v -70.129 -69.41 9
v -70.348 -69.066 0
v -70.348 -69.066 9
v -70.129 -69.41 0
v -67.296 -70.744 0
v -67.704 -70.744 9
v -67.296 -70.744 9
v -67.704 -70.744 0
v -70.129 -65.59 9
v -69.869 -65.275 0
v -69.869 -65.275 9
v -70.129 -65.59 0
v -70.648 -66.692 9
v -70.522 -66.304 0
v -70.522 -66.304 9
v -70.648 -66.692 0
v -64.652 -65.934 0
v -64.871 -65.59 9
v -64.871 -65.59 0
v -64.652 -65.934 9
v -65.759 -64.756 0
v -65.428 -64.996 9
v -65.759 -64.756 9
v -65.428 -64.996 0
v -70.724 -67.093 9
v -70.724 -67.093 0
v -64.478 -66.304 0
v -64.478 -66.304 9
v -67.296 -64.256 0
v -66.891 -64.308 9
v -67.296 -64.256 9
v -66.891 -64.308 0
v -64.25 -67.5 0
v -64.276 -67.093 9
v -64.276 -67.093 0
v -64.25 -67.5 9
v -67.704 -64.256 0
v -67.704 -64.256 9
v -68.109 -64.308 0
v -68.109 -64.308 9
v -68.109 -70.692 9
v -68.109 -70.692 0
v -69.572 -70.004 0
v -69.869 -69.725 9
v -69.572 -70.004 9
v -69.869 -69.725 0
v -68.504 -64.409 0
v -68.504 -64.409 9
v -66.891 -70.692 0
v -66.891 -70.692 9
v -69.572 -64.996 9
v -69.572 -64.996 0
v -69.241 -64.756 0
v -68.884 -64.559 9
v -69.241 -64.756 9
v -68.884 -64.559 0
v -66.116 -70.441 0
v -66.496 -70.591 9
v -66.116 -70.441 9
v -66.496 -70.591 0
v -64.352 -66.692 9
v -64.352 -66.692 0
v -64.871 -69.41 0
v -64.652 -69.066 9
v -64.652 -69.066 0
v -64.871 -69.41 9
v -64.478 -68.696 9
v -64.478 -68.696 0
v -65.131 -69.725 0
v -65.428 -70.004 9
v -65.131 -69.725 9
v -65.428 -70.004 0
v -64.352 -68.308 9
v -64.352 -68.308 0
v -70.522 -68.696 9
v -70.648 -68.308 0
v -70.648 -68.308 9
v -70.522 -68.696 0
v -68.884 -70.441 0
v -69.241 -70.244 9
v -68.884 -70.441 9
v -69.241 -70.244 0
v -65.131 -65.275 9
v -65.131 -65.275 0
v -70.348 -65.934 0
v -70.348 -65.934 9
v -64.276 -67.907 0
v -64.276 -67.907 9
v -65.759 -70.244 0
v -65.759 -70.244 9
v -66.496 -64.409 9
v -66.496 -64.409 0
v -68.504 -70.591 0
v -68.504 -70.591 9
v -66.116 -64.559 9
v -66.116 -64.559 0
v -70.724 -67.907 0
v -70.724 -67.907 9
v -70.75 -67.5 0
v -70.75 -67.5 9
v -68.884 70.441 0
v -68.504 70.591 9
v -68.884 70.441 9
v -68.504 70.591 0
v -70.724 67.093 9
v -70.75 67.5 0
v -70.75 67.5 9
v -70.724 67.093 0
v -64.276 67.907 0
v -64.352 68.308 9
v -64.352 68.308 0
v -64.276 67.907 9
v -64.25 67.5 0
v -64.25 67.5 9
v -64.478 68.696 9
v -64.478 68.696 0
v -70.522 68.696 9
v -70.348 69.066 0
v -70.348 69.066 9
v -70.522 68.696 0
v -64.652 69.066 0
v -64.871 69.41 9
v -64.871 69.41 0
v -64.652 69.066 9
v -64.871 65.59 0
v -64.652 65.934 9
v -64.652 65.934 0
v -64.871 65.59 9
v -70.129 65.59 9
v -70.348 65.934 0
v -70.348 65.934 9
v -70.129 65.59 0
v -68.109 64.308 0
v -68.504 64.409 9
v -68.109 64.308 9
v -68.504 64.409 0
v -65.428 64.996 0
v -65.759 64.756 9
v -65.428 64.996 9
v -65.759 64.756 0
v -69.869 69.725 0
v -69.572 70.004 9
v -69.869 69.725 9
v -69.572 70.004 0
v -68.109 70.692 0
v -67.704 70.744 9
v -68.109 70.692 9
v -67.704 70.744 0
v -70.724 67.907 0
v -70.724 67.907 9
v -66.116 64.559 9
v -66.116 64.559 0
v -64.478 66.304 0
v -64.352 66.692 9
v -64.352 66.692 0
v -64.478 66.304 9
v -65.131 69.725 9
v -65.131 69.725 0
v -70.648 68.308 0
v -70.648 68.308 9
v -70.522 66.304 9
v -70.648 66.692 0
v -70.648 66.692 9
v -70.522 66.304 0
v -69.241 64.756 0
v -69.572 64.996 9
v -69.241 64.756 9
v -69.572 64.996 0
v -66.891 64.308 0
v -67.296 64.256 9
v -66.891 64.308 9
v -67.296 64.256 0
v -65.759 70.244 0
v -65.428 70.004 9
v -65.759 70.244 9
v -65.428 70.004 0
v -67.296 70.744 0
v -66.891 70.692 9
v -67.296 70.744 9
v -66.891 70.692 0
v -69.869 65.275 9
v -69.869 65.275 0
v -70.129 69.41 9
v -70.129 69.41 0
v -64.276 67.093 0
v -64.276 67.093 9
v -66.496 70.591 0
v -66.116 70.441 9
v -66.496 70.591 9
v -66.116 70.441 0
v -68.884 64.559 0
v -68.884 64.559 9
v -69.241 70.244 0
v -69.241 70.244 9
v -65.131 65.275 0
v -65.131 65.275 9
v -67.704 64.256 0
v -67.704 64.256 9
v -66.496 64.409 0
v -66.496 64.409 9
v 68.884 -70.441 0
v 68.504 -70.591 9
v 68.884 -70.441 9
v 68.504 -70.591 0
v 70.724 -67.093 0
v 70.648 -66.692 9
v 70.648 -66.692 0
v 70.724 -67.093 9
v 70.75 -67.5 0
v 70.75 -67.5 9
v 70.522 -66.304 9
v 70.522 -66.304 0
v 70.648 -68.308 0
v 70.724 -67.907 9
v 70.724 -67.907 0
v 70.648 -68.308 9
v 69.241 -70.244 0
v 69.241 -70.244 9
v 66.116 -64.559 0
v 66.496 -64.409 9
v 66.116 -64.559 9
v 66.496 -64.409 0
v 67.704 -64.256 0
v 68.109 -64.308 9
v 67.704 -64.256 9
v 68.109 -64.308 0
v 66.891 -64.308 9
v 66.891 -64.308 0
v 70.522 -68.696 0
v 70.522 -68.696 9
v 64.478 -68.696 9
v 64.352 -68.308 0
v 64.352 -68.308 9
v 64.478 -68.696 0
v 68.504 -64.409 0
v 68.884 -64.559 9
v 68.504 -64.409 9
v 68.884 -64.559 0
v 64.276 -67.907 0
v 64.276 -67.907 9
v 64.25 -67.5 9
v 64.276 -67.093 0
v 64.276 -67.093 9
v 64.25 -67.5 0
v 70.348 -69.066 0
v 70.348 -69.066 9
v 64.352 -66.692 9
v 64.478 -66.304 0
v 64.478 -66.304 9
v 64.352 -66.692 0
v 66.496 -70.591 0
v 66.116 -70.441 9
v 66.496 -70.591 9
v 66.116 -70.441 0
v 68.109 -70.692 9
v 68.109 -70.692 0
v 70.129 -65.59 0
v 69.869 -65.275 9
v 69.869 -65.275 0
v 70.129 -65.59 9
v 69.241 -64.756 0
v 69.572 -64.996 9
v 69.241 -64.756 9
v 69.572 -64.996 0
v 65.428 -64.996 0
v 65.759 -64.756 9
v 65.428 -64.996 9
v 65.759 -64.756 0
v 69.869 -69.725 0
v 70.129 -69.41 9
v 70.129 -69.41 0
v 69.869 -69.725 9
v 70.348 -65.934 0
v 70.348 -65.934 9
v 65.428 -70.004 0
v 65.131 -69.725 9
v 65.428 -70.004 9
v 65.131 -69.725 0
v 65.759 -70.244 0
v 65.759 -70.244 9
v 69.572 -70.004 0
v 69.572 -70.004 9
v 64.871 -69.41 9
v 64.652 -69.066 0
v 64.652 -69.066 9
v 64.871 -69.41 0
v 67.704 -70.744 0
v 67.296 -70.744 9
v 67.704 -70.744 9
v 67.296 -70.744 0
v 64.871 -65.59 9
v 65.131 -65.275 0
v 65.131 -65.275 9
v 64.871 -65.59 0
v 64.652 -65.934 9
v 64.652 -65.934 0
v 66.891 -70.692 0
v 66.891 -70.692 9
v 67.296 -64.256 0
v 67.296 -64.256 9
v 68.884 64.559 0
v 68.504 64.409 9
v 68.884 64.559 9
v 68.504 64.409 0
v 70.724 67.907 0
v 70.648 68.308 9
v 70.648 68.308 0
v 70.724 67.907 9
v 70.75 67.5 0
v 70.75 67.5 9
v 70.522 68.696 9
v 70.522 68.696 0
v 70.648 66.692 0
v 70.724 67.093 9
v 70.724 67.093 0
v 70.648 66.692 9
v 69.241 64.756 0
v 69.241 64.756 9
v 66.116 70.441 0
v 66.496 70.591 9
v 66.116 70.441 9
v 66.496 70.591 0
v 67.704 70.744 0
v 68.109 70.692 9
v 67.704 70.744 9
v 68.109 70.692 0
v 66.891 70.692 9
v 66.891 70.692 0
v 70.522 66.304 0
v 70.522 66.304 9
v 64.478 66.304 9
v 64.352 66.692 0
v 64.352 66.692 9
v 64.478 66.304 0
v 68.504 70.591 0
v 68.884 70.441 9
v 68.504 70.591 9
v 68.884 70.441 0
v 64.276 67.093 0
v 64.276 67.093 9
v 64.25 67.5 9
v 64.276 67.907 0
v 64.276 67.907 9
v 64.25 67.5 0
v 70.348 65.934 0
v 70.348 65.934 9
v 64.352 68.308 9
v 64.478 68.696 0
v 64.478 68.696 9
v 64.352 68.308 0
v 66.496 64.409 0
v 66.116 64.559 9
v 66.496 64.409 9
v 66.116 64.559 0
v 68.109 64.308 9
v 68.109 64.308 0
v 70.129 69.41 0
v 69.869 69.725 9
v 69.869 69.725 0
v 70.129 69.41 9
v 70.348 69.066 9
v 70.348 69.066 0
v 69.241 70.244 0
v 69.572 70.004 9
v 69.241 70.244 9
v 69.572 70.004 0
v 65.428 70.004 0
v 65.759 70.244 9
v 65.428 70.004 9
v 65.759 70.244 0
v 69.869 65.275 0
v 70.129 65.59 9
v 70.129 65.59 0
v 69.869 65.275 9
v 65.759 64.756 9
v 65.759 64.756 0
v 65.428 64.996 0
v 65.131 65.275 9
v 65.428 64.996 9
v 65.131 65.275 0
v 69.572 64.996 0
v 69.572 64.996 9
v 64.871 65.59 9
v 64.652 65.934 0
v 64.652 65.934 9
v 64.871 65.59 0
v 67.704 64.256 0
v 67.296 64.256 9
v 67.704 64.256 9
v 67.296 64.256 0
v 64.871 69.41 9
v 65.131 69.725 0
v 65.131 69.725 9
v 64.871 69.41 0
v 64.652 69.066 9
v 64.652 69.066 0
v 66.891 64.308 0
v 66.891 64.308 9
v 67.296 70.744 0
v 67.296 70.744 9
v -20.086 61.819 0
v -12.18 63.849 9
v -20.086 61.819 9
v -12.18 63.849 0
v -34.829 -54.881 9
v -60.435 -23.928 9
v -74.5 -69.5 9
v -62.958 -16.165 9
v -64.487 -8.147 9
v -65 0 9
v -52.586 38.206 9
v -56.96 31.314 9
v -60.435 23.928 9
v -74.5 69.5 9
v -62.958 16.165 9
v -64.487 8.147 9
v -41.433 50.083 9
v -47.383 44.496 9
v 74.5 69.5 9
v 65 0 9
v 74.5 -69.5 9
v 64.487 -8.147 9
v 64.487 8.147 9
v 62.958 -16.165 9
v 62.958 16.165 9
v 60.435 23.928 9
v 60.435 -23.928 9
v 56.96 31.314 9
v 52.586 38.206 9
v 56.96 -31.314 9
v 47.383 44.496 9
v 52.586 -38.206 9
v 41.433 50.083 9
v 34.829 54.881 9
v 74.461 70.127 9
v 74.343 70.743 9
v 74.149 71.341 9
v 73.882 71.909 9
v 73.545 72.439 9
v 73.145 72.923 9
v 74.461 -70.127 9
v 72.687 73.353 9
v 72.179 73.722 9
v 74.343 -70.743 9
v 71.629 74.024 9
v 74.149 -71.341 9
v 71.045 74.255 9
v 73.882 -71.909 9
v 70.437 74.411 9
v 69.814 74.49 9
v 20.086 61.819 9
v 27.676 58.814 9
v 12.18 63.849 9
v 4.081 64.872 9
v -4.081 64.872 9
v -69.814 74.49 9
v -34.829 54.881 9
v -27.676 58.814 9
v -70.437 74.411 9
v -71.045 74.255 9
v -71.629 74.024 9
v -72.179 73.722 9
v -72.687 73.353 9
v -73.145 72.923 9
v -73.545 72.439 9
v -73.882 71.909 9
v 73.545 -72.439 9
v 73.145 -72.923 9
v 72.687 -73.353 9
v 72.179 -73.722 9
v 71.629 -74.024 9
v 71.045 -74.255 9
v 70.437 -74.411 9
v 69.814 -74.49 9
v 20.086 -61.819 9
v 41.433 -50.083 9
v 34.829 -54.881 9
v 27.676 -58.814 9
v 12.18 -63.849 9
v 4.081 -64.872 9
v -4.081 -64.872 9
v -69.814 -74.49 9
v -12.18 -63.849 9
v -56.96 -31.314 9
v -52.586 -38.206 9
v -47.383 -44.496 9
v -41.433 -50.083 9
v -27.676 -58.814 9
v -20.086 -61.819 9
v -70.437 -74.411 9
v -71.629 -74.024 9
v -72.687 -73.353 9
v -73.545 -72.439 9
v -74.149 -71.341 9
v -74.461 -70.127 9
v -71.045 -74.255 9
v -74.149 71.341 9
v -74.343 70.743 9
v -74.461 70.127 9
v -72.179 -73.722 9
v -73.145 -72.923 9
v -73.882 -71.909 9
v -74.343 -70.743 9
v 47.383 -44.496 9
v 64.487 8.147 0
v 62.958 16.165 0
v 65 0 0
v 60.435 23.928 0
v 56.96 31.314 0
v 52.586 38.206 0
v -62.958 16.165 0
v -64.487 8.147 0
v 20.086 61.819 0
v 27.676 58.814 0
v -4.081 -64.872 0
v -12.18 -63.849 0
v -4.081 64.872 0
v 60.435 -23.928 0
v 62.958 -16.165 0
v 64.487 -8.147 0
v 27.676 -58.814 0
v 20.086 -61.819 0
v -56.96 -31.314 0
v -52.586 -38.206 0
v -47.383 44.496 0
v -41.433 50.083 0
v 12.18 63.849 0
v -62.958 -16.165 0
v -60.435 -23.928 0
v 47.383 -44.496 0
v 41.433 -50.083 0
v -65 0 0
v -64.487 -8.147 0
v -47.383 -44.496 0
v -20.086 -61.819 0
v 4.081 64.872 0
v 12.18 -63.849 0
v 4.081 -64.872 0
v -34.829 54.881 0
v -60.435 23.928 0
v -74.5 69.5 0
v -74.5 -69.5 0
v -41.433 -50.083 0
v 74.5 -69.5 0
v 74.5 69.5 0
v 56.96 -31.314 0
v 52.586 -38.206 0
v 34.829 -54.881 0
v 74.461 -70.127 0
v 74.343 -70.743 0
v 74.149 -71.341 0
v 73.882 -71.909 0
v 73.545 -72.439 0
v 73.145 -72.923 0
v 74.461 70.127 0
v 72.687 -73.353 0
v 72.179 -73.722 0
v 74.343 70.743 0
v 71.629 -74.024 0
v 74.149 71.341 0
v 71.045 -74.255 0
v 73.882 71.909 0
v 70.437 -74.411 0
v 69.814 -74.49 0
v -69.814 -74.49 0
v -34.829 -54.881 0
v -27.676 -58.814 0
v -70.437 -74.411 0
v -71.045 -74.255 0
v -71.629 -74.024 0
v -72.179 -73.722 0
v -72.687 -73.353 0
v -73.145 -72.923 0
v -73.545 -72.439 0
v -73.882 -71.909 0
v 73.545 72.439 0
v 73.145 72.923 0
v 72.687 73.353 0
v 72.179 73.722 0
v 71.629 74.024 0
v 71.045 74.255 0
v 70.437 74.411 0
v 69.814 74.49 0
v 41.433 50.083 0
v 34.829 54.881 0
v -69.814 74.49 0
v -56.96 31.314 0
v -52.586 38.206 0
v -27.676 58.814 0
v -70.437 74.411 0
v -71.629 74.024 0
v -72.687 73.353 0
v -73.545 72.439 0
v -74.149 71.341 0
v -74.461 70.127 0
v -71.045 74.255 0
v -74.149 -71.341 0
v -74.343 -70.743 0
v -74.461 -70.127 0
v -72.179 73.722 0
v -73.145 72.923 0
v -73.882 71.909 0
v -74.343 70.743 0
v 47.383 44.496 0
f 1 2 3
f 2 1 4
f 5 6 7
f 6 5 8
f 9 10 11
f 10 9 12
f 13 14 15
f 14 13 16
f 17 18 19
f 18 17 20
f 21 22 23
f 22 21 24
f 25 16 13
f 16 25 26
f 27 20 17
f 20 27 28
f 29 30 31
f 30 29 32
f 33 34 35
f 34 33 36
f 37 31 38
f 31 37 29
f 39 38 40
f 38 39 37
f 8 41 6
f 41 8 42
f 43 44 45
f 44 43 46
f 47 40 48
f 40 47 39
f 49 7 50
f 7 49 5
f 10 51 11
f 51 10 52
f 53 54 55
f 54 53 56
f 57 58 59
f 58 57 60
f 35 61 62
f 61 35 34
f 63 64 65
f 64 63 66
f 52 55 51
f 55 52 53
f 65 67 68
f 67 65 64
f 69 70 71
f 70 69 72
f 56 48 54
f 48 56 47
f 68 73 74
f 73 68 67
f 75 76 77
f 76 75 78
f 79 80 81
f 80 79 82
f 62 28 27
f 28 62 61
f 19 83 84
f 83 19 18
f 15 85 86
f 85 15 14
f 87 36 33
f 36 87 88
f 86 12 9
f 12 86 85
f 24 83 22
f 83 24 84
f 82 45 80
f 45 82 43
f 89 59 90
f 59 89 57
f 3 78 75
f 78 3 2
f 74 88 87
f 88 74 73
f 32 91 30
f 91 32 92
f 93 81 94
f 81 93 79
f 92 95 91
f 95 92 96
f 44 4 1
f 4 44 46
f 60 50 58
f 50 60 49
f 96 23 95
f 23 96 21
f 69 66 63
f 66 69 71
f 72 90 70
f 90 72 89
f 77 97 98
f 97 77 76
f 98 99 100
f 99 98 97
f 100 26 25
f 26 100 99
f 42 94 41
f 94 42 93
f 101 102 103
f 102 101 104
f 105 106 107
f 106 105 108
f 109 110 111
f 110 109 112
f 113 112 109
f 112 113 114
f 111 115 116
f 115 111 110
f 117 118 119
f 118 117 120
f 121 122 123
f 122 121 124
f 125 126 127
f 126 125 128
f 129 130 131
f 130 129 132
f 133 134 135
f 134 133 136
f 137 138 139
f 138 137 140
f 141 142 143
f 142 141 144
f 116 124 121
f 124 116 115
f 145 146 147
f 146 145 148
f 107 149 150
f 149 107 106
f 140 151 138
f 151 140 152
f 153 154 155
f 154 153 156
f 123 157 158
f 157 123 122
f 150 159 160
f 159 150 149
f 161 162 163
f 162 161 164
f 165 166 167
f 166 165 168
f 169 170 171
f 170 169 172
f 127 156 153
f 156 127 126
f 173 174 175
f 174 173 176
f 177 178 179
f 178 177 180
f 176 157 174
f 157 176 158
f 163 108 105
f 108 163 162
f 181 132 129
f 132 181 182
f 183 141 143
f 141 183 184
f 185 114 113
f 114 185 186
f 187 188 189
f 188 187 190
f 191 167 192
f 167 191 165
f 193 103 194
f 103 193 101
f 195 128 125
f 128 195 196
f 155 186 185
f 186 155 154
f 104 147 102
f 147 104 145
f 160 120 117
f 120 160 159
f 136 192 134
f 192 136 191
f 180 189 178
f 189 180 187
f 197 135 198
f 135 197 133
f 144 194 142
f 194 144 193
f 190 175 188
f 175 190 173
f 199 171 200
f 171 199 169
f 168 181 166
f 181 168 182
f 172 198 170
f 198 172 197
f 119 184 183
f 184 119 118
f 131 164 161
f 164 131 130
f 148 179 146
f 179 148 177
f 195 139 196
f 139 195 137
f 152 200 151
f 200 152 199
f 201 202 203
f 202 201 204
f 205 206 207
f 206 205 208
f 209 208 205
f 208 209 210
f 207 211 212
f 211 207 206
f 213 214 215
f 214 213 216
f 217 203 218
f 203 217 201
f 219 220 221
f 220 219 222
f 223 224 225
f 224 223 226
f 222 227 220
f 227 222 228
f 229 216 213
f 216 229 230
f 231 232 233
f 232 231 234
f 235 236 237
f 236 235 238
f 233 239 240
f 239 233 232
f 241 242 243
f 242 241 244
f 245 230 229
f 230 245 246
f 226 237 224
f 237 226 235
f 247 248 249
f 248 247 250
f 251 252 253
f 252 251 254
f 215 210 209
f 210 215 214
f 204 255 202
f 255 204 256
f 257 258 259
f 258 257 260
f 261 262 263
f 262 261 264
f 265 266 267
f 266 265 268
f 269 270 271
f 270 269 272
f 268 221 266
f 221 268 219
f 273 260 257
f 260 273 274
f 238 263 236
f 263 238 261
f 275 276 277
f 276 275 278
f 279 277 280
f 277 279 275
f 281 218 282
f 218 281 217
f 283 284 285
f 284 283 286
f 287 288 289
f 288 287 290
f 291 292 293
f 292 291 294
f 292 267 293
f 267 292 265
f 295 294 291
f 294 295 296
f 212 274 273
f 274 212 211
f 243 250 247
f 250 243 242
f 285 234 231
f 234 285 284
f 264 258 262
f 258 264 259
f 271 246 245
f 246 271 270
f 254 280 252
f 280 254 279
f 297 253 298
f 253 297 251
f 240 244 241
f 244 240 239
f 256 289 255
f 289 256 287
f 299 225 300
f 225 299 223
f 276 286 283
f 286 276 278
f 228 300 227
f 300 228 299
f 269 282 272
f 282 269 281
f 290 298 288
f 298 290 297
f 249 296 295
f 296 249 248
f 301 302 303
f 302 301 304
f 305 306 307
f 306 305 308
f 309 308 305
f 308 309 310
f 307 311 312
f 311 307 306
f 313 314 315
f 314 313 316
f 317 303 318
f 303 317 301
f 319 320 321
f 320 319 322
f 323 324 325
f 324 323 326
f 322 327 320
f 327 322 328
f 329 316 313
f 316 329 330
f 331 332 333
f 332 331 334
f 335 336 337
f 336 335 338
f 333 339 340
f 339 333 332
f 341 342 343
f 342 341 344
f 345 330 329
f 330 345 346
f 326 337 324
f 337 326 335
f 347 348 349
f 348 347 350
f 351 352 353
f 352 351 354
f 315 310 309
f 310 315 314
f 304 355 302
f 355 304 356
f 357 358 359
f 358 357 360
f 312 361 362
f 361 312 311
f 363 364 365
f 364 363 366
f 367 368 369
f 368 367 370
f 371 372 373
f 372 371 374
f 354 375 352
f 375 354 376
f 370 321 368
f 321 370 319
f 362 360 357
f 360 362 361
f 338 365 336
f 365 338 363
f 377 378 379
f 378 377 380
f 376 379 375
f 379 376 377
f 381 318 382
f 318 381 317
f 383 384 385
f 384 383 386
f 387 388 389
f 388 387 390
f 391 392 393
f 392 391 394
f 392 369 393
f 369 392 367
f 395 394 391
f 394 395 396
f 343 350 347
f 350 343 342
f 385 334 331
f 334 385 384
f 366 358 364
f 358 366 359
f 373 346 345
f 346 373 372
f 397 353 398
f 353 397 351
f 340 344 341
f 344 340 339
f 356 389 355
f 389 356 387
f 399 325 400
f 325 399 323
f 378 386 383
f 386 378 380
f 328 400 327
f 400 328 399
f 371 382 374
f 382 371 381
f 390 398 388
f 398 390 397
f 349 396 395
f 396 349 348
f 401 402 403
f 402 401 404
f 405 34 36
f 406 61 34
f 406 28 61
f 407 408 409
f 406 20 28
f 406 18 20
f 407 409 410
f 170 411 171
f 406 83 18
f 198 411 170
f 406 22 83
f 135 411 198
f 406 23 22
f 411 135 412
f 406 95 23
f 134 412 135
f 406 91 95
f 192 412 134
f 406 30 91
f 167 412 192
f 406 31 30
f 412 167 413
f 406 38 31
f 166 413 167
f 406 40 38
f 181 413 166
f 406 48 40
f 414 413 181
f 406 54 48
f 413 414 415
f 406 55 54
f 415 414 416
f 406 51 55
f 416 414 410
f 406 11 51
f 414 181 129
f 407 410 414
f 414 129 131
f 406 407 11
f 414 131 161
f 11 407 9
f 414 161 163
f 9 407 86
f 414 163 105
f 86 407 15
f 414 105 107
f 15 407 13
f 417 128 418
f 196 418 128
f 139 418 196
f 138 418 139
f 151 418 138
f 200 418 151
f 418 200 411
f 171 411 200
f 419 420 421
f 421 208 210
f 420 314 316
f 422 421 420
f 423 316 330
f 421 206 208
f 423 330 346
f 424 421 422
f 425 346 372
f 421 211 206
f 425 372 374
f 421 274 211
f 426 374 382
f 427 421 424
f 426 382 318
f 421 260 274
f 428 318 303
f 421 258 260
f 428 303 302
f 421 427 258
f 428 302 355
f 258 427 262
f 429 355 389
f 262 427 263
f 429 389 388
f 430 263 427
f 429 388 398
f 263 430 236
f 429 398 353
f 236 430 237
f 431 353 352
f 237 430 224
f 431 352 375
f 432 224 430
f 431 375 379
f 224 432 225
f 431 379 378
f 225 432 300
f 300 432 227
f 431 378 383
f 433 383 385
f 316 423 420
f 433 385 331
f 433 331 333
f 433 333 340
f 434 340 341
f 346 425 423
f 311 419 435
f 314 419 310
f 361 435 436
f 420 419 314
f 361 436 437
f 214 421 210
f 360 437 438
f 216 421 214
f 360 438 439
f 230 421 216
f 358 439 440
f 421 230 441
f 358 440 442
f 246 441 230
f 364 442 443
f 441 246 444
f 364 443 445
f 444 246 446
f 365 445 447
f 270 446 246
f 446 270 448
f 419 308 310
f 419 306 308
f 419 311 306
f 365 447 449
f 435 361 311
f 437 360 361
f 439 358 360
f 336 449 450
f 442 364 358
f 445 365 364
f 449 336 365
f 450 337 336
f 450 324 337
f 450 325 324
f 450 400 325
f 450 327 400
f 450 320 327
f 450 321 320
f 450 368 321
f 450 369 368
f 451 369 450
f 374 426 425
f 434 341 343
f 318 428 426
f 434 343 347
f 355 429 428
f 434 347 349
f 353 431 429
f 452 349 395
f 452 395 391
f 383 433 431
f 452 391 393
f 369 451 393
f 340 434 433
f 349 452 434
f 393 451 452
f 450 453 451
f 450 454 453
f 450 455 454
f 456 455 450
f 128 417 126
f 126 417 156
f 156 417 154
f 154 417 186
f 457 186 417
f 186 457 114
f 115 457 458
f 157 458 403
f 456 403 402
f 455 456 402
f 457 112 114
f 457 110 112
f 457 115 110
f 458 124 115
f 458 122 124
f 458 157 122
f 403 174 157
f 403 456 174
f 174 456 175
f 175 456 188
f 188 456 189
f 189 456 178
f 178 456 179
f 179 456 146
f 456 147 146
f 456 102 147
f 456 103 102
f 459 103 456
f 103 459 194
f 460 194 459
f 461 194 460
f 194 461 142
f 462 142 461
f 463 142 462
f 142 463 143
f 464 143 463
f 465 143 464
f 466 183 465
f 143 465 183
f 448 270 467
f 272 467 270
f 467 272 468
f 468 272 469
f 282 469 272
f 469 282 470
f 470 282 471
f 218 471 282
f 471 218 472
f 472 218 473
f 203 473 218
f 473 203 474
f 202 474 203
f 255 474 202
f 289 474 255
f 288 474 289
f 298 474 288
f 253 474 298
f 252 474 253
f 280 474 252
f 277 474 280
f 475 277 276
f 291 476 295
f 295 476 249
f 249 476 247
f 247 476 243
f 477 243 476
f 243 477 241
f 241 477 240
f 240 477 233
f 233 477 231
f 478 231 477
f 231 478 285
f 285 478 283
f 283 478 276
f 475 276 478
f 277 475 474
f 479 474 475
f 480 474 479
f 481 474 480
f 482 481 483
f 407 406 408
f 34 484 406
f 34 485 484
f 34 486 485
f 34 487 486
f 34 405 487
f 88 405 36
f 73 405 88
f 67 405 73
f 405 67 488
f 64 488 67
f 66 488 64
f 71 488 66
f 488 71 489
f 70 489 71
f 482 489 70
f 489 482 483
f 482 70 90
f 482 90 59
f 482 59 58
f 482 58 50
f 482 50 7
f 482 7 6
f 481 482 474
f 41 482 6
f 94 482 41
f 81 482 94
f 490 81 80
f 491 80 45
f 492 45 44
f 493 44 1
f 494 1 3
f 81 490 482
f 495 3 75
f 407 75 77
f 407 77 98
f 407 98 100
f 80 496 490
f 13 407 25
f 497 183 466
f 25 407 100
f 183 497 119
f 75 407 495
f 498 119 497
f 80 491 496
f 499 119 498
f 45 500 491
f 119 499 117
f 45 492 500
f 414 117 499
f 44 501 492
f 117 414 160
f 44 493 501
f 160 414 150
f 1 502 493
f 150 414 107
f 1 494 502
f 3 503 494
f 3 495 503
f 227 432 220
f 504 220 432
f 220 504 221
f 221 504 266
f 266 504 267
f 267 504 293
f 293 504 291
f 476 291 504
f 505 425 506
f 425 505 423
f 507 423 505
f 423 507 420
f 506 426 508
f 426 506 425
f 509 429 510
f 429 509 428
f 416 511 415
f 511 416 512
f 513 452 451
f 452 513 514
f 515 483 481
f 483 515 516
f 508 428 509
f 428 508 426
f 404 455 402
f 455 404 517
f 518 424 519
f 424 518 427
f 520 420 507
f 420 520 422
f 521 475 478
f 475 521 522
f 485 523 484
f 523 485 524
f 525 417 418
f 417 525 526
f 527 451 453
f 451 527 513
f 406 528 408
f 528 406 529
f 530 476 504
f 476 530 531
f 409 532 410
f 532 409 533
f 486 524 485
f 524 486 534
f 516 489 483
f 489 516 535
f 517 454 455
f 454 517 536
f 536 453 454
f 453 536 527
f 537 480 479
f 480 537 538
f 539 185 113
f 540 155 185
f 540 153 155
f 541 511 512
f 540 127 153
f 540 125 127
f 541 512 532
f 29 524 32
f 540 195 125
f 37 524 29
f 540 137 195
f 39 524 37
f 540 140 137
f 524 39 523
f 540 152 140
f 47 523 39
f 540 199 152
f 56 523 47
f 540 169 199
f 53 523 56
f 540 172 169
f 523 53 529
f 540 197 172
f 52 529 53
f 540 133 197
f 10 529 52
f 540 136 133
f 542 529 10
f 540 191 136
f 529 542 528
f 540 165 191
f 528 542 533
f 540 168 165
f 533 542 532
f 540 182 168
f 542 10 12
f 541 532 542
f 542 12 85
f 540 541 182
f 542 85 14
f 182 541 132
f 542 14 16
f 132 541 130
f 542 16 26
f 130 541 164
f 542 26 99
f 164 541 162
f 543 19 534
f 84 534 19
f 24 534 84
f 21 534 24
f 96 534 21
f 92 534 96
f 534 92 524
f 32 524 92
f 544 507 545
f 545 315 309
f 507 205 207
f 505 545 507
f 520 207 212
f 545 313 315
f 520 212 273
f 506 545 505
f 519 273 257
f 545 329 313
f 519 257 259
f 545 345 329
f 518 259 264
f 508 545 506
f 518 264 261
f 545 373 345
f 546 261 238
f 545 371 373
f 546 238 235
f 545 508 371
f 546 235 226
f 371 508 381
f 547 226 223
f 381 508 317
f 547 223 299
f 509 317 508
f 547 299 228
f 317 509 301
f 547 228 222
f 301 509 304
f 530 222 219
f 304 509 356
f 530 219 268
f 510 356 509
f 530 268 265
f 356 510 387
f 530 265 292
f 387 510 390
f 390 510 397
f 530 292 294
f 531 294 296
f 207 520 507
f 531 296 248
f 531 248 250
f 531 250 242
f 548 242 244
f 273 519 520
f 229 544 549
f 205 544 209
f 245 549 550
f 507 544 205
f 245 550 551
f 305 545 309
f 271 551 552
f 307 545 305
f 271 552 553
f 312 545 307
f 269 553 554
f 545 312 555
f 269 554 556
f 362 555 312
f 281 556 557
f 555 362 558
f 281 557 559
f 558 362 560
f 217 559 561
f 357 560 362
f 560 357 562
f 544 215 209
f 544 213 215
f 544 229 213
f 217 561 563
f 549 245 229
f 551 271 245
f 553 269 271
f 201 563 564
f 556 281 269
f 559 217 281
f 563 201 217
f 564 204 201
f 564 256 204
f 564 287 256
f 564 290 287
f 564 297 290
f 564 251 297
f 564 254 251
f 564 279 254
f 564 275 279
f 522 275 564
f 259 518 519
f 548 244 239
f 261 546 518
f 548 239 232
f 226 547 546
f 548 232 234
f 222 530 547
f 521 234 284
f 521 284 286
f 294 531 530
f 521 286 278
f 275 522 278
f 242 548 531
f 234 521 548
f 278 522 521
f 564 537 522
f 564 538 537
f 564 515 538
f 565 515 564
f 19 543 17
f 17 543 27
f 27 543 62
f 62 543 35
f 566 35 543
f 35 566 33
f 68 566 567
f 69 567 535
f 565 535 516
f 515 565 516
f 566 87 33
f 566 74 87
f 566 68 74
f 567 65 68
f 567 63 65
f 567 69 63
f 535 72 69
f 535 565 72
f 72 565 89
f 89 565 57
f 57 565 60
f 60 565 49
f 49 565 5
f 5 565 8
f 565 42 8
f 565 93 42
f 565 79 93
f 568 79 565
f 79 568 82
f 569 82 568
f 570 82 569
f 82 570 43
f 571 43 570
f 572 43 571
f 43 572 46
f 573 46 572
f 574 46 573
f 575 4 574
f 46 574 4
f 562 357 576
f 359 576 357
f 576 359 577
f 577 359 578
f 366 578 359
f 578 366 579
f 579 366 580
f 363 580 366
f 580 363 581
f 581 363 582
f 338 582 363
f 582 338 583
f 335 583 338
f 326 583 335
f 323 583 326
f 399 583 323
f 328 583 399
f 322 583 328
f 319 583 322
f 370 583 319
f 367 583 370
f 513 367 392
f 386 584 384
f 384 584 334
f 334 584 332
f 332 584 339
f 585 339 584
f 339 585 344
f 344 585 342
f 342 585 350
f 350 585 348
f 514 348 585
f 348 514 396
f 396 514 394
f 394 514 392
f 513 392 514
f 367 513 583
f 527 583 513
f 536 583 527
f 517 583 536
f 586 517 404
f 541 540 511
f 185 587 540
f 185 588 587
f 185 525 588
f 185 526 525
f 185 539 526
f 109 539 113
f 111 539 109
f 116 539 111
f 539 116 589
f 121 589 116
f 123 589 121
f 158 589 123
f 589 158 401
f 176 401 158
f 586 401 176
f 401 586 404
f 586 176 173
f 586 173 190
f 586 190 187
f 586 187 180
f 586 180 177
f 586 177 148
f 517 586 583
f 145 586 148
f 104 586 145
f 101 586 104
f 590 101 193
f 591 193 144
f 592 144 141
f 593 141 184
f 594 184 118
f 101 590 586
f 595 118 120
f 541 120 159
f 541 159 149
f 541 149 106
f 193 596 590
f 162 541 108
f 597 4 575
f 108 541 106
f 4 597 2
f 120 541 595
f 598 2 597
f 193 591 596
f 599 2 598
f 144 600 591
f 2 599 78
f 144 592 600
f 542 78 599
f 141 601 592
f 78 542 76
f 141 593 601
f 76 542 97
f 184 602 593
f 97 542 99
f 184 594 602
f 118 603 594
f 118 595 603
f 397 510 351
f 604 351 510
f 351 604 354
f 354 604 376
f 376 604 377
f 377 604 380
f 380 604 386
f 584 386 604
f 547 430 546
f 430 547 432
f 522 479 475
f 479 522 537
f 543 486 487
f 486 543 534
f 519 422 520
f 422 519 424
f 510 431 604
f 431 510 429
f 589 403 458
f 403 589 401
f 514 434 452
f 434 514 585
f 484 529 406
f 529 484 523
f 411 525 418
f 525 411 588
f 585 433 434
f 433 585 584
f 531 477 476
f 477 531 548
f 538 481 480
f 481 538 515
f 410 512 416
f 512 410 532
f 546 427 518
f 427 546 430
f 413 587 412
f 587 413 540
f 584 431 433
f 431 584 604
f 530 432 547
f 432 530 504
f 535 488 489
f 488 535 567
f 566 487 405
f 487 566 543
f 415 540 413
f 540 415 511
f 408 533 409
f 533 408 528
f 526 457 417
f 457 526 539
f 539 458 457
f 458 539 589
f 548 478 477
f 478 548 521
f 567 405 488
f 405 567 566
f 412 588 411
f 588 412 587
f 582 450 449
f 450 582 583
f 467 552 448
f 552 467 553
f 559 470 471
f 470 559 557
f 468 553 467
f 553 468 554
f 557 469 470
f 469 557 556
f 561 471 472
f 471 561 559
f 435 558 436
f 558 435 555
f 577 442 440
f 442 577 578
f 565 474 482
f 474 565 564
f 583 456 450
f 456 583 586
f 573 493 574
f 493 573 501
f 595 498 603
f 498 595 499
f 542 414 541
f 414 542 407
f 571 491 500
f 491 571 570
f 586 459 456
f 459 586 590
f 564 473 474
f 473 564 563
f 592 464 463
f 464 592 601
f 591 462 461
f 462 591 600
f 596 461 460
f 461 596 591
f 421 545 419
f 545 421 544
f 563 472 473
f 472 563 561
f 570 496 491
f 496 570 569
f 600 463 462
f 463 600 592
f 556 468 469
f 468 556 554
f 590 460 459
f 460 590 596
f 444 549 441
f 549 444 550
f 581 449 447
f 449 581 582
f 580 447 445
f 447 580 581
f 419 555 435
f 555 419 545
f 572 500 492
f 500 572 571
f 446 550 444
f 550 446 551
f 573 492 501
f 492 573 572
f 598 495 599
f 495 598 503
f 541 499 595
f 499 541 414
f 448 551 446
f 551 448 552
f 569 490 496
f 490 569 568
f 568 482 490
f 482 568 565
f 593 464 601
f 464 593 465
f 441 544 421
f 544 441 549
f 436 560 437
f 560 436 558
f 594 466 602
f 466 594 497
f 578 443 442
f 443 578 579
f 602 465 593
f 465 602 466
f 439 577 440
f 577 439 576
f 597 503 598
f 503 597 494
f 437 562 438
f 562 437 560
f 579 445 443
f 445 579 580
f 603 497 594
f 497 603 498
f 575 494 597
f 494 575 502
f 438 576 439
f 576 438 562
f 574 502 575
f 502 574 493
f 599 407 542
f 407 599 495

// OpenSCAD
$fn = 50;


difference() {
	union() {
		hull() {
			translate(v = [-69.5000000000, 69.5000000000, 0]) {
				cylinder(h = 9, r = 5);
			}
			translate(v = [69.5000000000, 69.5000000000, 0]) {
				cylinder(h = 9, r = 5);
			}
			translate(v = [-69.5000000000, -69.5000000000, 0]) {
				cylinder(h = 9, r = 5);
			}
			translate(v = [69.5000000000, -69.5000000000, 0]) {
				cylinder(h = 9, r = 5);
			}
		}
	}
	union() {
		#translate(v = [-67.5000000000, -67.5000000000, -100.0000000000]) {
			cylinder(h = 200, r = 3.2500000000);
		}
		#translate(v = [-67.5000000000, 67.5000000000, -100.0000000000]) {
			cylinder(h = 200, r = 3.2500000000);
		}
		#translate(v = [67.5000000000, -67.5000000000, -100.0000000000]) {
			cylinder(h = 200, r = 3.2500000000);
		}
		#translate(v = [67.5000000000, 67.5000000000, -100.0000000000]) {
			cylinder(h = 200, r = 3.2500000000);
		}
		#cylinder(h = 9, r = 65.0000000000);
	}
}
